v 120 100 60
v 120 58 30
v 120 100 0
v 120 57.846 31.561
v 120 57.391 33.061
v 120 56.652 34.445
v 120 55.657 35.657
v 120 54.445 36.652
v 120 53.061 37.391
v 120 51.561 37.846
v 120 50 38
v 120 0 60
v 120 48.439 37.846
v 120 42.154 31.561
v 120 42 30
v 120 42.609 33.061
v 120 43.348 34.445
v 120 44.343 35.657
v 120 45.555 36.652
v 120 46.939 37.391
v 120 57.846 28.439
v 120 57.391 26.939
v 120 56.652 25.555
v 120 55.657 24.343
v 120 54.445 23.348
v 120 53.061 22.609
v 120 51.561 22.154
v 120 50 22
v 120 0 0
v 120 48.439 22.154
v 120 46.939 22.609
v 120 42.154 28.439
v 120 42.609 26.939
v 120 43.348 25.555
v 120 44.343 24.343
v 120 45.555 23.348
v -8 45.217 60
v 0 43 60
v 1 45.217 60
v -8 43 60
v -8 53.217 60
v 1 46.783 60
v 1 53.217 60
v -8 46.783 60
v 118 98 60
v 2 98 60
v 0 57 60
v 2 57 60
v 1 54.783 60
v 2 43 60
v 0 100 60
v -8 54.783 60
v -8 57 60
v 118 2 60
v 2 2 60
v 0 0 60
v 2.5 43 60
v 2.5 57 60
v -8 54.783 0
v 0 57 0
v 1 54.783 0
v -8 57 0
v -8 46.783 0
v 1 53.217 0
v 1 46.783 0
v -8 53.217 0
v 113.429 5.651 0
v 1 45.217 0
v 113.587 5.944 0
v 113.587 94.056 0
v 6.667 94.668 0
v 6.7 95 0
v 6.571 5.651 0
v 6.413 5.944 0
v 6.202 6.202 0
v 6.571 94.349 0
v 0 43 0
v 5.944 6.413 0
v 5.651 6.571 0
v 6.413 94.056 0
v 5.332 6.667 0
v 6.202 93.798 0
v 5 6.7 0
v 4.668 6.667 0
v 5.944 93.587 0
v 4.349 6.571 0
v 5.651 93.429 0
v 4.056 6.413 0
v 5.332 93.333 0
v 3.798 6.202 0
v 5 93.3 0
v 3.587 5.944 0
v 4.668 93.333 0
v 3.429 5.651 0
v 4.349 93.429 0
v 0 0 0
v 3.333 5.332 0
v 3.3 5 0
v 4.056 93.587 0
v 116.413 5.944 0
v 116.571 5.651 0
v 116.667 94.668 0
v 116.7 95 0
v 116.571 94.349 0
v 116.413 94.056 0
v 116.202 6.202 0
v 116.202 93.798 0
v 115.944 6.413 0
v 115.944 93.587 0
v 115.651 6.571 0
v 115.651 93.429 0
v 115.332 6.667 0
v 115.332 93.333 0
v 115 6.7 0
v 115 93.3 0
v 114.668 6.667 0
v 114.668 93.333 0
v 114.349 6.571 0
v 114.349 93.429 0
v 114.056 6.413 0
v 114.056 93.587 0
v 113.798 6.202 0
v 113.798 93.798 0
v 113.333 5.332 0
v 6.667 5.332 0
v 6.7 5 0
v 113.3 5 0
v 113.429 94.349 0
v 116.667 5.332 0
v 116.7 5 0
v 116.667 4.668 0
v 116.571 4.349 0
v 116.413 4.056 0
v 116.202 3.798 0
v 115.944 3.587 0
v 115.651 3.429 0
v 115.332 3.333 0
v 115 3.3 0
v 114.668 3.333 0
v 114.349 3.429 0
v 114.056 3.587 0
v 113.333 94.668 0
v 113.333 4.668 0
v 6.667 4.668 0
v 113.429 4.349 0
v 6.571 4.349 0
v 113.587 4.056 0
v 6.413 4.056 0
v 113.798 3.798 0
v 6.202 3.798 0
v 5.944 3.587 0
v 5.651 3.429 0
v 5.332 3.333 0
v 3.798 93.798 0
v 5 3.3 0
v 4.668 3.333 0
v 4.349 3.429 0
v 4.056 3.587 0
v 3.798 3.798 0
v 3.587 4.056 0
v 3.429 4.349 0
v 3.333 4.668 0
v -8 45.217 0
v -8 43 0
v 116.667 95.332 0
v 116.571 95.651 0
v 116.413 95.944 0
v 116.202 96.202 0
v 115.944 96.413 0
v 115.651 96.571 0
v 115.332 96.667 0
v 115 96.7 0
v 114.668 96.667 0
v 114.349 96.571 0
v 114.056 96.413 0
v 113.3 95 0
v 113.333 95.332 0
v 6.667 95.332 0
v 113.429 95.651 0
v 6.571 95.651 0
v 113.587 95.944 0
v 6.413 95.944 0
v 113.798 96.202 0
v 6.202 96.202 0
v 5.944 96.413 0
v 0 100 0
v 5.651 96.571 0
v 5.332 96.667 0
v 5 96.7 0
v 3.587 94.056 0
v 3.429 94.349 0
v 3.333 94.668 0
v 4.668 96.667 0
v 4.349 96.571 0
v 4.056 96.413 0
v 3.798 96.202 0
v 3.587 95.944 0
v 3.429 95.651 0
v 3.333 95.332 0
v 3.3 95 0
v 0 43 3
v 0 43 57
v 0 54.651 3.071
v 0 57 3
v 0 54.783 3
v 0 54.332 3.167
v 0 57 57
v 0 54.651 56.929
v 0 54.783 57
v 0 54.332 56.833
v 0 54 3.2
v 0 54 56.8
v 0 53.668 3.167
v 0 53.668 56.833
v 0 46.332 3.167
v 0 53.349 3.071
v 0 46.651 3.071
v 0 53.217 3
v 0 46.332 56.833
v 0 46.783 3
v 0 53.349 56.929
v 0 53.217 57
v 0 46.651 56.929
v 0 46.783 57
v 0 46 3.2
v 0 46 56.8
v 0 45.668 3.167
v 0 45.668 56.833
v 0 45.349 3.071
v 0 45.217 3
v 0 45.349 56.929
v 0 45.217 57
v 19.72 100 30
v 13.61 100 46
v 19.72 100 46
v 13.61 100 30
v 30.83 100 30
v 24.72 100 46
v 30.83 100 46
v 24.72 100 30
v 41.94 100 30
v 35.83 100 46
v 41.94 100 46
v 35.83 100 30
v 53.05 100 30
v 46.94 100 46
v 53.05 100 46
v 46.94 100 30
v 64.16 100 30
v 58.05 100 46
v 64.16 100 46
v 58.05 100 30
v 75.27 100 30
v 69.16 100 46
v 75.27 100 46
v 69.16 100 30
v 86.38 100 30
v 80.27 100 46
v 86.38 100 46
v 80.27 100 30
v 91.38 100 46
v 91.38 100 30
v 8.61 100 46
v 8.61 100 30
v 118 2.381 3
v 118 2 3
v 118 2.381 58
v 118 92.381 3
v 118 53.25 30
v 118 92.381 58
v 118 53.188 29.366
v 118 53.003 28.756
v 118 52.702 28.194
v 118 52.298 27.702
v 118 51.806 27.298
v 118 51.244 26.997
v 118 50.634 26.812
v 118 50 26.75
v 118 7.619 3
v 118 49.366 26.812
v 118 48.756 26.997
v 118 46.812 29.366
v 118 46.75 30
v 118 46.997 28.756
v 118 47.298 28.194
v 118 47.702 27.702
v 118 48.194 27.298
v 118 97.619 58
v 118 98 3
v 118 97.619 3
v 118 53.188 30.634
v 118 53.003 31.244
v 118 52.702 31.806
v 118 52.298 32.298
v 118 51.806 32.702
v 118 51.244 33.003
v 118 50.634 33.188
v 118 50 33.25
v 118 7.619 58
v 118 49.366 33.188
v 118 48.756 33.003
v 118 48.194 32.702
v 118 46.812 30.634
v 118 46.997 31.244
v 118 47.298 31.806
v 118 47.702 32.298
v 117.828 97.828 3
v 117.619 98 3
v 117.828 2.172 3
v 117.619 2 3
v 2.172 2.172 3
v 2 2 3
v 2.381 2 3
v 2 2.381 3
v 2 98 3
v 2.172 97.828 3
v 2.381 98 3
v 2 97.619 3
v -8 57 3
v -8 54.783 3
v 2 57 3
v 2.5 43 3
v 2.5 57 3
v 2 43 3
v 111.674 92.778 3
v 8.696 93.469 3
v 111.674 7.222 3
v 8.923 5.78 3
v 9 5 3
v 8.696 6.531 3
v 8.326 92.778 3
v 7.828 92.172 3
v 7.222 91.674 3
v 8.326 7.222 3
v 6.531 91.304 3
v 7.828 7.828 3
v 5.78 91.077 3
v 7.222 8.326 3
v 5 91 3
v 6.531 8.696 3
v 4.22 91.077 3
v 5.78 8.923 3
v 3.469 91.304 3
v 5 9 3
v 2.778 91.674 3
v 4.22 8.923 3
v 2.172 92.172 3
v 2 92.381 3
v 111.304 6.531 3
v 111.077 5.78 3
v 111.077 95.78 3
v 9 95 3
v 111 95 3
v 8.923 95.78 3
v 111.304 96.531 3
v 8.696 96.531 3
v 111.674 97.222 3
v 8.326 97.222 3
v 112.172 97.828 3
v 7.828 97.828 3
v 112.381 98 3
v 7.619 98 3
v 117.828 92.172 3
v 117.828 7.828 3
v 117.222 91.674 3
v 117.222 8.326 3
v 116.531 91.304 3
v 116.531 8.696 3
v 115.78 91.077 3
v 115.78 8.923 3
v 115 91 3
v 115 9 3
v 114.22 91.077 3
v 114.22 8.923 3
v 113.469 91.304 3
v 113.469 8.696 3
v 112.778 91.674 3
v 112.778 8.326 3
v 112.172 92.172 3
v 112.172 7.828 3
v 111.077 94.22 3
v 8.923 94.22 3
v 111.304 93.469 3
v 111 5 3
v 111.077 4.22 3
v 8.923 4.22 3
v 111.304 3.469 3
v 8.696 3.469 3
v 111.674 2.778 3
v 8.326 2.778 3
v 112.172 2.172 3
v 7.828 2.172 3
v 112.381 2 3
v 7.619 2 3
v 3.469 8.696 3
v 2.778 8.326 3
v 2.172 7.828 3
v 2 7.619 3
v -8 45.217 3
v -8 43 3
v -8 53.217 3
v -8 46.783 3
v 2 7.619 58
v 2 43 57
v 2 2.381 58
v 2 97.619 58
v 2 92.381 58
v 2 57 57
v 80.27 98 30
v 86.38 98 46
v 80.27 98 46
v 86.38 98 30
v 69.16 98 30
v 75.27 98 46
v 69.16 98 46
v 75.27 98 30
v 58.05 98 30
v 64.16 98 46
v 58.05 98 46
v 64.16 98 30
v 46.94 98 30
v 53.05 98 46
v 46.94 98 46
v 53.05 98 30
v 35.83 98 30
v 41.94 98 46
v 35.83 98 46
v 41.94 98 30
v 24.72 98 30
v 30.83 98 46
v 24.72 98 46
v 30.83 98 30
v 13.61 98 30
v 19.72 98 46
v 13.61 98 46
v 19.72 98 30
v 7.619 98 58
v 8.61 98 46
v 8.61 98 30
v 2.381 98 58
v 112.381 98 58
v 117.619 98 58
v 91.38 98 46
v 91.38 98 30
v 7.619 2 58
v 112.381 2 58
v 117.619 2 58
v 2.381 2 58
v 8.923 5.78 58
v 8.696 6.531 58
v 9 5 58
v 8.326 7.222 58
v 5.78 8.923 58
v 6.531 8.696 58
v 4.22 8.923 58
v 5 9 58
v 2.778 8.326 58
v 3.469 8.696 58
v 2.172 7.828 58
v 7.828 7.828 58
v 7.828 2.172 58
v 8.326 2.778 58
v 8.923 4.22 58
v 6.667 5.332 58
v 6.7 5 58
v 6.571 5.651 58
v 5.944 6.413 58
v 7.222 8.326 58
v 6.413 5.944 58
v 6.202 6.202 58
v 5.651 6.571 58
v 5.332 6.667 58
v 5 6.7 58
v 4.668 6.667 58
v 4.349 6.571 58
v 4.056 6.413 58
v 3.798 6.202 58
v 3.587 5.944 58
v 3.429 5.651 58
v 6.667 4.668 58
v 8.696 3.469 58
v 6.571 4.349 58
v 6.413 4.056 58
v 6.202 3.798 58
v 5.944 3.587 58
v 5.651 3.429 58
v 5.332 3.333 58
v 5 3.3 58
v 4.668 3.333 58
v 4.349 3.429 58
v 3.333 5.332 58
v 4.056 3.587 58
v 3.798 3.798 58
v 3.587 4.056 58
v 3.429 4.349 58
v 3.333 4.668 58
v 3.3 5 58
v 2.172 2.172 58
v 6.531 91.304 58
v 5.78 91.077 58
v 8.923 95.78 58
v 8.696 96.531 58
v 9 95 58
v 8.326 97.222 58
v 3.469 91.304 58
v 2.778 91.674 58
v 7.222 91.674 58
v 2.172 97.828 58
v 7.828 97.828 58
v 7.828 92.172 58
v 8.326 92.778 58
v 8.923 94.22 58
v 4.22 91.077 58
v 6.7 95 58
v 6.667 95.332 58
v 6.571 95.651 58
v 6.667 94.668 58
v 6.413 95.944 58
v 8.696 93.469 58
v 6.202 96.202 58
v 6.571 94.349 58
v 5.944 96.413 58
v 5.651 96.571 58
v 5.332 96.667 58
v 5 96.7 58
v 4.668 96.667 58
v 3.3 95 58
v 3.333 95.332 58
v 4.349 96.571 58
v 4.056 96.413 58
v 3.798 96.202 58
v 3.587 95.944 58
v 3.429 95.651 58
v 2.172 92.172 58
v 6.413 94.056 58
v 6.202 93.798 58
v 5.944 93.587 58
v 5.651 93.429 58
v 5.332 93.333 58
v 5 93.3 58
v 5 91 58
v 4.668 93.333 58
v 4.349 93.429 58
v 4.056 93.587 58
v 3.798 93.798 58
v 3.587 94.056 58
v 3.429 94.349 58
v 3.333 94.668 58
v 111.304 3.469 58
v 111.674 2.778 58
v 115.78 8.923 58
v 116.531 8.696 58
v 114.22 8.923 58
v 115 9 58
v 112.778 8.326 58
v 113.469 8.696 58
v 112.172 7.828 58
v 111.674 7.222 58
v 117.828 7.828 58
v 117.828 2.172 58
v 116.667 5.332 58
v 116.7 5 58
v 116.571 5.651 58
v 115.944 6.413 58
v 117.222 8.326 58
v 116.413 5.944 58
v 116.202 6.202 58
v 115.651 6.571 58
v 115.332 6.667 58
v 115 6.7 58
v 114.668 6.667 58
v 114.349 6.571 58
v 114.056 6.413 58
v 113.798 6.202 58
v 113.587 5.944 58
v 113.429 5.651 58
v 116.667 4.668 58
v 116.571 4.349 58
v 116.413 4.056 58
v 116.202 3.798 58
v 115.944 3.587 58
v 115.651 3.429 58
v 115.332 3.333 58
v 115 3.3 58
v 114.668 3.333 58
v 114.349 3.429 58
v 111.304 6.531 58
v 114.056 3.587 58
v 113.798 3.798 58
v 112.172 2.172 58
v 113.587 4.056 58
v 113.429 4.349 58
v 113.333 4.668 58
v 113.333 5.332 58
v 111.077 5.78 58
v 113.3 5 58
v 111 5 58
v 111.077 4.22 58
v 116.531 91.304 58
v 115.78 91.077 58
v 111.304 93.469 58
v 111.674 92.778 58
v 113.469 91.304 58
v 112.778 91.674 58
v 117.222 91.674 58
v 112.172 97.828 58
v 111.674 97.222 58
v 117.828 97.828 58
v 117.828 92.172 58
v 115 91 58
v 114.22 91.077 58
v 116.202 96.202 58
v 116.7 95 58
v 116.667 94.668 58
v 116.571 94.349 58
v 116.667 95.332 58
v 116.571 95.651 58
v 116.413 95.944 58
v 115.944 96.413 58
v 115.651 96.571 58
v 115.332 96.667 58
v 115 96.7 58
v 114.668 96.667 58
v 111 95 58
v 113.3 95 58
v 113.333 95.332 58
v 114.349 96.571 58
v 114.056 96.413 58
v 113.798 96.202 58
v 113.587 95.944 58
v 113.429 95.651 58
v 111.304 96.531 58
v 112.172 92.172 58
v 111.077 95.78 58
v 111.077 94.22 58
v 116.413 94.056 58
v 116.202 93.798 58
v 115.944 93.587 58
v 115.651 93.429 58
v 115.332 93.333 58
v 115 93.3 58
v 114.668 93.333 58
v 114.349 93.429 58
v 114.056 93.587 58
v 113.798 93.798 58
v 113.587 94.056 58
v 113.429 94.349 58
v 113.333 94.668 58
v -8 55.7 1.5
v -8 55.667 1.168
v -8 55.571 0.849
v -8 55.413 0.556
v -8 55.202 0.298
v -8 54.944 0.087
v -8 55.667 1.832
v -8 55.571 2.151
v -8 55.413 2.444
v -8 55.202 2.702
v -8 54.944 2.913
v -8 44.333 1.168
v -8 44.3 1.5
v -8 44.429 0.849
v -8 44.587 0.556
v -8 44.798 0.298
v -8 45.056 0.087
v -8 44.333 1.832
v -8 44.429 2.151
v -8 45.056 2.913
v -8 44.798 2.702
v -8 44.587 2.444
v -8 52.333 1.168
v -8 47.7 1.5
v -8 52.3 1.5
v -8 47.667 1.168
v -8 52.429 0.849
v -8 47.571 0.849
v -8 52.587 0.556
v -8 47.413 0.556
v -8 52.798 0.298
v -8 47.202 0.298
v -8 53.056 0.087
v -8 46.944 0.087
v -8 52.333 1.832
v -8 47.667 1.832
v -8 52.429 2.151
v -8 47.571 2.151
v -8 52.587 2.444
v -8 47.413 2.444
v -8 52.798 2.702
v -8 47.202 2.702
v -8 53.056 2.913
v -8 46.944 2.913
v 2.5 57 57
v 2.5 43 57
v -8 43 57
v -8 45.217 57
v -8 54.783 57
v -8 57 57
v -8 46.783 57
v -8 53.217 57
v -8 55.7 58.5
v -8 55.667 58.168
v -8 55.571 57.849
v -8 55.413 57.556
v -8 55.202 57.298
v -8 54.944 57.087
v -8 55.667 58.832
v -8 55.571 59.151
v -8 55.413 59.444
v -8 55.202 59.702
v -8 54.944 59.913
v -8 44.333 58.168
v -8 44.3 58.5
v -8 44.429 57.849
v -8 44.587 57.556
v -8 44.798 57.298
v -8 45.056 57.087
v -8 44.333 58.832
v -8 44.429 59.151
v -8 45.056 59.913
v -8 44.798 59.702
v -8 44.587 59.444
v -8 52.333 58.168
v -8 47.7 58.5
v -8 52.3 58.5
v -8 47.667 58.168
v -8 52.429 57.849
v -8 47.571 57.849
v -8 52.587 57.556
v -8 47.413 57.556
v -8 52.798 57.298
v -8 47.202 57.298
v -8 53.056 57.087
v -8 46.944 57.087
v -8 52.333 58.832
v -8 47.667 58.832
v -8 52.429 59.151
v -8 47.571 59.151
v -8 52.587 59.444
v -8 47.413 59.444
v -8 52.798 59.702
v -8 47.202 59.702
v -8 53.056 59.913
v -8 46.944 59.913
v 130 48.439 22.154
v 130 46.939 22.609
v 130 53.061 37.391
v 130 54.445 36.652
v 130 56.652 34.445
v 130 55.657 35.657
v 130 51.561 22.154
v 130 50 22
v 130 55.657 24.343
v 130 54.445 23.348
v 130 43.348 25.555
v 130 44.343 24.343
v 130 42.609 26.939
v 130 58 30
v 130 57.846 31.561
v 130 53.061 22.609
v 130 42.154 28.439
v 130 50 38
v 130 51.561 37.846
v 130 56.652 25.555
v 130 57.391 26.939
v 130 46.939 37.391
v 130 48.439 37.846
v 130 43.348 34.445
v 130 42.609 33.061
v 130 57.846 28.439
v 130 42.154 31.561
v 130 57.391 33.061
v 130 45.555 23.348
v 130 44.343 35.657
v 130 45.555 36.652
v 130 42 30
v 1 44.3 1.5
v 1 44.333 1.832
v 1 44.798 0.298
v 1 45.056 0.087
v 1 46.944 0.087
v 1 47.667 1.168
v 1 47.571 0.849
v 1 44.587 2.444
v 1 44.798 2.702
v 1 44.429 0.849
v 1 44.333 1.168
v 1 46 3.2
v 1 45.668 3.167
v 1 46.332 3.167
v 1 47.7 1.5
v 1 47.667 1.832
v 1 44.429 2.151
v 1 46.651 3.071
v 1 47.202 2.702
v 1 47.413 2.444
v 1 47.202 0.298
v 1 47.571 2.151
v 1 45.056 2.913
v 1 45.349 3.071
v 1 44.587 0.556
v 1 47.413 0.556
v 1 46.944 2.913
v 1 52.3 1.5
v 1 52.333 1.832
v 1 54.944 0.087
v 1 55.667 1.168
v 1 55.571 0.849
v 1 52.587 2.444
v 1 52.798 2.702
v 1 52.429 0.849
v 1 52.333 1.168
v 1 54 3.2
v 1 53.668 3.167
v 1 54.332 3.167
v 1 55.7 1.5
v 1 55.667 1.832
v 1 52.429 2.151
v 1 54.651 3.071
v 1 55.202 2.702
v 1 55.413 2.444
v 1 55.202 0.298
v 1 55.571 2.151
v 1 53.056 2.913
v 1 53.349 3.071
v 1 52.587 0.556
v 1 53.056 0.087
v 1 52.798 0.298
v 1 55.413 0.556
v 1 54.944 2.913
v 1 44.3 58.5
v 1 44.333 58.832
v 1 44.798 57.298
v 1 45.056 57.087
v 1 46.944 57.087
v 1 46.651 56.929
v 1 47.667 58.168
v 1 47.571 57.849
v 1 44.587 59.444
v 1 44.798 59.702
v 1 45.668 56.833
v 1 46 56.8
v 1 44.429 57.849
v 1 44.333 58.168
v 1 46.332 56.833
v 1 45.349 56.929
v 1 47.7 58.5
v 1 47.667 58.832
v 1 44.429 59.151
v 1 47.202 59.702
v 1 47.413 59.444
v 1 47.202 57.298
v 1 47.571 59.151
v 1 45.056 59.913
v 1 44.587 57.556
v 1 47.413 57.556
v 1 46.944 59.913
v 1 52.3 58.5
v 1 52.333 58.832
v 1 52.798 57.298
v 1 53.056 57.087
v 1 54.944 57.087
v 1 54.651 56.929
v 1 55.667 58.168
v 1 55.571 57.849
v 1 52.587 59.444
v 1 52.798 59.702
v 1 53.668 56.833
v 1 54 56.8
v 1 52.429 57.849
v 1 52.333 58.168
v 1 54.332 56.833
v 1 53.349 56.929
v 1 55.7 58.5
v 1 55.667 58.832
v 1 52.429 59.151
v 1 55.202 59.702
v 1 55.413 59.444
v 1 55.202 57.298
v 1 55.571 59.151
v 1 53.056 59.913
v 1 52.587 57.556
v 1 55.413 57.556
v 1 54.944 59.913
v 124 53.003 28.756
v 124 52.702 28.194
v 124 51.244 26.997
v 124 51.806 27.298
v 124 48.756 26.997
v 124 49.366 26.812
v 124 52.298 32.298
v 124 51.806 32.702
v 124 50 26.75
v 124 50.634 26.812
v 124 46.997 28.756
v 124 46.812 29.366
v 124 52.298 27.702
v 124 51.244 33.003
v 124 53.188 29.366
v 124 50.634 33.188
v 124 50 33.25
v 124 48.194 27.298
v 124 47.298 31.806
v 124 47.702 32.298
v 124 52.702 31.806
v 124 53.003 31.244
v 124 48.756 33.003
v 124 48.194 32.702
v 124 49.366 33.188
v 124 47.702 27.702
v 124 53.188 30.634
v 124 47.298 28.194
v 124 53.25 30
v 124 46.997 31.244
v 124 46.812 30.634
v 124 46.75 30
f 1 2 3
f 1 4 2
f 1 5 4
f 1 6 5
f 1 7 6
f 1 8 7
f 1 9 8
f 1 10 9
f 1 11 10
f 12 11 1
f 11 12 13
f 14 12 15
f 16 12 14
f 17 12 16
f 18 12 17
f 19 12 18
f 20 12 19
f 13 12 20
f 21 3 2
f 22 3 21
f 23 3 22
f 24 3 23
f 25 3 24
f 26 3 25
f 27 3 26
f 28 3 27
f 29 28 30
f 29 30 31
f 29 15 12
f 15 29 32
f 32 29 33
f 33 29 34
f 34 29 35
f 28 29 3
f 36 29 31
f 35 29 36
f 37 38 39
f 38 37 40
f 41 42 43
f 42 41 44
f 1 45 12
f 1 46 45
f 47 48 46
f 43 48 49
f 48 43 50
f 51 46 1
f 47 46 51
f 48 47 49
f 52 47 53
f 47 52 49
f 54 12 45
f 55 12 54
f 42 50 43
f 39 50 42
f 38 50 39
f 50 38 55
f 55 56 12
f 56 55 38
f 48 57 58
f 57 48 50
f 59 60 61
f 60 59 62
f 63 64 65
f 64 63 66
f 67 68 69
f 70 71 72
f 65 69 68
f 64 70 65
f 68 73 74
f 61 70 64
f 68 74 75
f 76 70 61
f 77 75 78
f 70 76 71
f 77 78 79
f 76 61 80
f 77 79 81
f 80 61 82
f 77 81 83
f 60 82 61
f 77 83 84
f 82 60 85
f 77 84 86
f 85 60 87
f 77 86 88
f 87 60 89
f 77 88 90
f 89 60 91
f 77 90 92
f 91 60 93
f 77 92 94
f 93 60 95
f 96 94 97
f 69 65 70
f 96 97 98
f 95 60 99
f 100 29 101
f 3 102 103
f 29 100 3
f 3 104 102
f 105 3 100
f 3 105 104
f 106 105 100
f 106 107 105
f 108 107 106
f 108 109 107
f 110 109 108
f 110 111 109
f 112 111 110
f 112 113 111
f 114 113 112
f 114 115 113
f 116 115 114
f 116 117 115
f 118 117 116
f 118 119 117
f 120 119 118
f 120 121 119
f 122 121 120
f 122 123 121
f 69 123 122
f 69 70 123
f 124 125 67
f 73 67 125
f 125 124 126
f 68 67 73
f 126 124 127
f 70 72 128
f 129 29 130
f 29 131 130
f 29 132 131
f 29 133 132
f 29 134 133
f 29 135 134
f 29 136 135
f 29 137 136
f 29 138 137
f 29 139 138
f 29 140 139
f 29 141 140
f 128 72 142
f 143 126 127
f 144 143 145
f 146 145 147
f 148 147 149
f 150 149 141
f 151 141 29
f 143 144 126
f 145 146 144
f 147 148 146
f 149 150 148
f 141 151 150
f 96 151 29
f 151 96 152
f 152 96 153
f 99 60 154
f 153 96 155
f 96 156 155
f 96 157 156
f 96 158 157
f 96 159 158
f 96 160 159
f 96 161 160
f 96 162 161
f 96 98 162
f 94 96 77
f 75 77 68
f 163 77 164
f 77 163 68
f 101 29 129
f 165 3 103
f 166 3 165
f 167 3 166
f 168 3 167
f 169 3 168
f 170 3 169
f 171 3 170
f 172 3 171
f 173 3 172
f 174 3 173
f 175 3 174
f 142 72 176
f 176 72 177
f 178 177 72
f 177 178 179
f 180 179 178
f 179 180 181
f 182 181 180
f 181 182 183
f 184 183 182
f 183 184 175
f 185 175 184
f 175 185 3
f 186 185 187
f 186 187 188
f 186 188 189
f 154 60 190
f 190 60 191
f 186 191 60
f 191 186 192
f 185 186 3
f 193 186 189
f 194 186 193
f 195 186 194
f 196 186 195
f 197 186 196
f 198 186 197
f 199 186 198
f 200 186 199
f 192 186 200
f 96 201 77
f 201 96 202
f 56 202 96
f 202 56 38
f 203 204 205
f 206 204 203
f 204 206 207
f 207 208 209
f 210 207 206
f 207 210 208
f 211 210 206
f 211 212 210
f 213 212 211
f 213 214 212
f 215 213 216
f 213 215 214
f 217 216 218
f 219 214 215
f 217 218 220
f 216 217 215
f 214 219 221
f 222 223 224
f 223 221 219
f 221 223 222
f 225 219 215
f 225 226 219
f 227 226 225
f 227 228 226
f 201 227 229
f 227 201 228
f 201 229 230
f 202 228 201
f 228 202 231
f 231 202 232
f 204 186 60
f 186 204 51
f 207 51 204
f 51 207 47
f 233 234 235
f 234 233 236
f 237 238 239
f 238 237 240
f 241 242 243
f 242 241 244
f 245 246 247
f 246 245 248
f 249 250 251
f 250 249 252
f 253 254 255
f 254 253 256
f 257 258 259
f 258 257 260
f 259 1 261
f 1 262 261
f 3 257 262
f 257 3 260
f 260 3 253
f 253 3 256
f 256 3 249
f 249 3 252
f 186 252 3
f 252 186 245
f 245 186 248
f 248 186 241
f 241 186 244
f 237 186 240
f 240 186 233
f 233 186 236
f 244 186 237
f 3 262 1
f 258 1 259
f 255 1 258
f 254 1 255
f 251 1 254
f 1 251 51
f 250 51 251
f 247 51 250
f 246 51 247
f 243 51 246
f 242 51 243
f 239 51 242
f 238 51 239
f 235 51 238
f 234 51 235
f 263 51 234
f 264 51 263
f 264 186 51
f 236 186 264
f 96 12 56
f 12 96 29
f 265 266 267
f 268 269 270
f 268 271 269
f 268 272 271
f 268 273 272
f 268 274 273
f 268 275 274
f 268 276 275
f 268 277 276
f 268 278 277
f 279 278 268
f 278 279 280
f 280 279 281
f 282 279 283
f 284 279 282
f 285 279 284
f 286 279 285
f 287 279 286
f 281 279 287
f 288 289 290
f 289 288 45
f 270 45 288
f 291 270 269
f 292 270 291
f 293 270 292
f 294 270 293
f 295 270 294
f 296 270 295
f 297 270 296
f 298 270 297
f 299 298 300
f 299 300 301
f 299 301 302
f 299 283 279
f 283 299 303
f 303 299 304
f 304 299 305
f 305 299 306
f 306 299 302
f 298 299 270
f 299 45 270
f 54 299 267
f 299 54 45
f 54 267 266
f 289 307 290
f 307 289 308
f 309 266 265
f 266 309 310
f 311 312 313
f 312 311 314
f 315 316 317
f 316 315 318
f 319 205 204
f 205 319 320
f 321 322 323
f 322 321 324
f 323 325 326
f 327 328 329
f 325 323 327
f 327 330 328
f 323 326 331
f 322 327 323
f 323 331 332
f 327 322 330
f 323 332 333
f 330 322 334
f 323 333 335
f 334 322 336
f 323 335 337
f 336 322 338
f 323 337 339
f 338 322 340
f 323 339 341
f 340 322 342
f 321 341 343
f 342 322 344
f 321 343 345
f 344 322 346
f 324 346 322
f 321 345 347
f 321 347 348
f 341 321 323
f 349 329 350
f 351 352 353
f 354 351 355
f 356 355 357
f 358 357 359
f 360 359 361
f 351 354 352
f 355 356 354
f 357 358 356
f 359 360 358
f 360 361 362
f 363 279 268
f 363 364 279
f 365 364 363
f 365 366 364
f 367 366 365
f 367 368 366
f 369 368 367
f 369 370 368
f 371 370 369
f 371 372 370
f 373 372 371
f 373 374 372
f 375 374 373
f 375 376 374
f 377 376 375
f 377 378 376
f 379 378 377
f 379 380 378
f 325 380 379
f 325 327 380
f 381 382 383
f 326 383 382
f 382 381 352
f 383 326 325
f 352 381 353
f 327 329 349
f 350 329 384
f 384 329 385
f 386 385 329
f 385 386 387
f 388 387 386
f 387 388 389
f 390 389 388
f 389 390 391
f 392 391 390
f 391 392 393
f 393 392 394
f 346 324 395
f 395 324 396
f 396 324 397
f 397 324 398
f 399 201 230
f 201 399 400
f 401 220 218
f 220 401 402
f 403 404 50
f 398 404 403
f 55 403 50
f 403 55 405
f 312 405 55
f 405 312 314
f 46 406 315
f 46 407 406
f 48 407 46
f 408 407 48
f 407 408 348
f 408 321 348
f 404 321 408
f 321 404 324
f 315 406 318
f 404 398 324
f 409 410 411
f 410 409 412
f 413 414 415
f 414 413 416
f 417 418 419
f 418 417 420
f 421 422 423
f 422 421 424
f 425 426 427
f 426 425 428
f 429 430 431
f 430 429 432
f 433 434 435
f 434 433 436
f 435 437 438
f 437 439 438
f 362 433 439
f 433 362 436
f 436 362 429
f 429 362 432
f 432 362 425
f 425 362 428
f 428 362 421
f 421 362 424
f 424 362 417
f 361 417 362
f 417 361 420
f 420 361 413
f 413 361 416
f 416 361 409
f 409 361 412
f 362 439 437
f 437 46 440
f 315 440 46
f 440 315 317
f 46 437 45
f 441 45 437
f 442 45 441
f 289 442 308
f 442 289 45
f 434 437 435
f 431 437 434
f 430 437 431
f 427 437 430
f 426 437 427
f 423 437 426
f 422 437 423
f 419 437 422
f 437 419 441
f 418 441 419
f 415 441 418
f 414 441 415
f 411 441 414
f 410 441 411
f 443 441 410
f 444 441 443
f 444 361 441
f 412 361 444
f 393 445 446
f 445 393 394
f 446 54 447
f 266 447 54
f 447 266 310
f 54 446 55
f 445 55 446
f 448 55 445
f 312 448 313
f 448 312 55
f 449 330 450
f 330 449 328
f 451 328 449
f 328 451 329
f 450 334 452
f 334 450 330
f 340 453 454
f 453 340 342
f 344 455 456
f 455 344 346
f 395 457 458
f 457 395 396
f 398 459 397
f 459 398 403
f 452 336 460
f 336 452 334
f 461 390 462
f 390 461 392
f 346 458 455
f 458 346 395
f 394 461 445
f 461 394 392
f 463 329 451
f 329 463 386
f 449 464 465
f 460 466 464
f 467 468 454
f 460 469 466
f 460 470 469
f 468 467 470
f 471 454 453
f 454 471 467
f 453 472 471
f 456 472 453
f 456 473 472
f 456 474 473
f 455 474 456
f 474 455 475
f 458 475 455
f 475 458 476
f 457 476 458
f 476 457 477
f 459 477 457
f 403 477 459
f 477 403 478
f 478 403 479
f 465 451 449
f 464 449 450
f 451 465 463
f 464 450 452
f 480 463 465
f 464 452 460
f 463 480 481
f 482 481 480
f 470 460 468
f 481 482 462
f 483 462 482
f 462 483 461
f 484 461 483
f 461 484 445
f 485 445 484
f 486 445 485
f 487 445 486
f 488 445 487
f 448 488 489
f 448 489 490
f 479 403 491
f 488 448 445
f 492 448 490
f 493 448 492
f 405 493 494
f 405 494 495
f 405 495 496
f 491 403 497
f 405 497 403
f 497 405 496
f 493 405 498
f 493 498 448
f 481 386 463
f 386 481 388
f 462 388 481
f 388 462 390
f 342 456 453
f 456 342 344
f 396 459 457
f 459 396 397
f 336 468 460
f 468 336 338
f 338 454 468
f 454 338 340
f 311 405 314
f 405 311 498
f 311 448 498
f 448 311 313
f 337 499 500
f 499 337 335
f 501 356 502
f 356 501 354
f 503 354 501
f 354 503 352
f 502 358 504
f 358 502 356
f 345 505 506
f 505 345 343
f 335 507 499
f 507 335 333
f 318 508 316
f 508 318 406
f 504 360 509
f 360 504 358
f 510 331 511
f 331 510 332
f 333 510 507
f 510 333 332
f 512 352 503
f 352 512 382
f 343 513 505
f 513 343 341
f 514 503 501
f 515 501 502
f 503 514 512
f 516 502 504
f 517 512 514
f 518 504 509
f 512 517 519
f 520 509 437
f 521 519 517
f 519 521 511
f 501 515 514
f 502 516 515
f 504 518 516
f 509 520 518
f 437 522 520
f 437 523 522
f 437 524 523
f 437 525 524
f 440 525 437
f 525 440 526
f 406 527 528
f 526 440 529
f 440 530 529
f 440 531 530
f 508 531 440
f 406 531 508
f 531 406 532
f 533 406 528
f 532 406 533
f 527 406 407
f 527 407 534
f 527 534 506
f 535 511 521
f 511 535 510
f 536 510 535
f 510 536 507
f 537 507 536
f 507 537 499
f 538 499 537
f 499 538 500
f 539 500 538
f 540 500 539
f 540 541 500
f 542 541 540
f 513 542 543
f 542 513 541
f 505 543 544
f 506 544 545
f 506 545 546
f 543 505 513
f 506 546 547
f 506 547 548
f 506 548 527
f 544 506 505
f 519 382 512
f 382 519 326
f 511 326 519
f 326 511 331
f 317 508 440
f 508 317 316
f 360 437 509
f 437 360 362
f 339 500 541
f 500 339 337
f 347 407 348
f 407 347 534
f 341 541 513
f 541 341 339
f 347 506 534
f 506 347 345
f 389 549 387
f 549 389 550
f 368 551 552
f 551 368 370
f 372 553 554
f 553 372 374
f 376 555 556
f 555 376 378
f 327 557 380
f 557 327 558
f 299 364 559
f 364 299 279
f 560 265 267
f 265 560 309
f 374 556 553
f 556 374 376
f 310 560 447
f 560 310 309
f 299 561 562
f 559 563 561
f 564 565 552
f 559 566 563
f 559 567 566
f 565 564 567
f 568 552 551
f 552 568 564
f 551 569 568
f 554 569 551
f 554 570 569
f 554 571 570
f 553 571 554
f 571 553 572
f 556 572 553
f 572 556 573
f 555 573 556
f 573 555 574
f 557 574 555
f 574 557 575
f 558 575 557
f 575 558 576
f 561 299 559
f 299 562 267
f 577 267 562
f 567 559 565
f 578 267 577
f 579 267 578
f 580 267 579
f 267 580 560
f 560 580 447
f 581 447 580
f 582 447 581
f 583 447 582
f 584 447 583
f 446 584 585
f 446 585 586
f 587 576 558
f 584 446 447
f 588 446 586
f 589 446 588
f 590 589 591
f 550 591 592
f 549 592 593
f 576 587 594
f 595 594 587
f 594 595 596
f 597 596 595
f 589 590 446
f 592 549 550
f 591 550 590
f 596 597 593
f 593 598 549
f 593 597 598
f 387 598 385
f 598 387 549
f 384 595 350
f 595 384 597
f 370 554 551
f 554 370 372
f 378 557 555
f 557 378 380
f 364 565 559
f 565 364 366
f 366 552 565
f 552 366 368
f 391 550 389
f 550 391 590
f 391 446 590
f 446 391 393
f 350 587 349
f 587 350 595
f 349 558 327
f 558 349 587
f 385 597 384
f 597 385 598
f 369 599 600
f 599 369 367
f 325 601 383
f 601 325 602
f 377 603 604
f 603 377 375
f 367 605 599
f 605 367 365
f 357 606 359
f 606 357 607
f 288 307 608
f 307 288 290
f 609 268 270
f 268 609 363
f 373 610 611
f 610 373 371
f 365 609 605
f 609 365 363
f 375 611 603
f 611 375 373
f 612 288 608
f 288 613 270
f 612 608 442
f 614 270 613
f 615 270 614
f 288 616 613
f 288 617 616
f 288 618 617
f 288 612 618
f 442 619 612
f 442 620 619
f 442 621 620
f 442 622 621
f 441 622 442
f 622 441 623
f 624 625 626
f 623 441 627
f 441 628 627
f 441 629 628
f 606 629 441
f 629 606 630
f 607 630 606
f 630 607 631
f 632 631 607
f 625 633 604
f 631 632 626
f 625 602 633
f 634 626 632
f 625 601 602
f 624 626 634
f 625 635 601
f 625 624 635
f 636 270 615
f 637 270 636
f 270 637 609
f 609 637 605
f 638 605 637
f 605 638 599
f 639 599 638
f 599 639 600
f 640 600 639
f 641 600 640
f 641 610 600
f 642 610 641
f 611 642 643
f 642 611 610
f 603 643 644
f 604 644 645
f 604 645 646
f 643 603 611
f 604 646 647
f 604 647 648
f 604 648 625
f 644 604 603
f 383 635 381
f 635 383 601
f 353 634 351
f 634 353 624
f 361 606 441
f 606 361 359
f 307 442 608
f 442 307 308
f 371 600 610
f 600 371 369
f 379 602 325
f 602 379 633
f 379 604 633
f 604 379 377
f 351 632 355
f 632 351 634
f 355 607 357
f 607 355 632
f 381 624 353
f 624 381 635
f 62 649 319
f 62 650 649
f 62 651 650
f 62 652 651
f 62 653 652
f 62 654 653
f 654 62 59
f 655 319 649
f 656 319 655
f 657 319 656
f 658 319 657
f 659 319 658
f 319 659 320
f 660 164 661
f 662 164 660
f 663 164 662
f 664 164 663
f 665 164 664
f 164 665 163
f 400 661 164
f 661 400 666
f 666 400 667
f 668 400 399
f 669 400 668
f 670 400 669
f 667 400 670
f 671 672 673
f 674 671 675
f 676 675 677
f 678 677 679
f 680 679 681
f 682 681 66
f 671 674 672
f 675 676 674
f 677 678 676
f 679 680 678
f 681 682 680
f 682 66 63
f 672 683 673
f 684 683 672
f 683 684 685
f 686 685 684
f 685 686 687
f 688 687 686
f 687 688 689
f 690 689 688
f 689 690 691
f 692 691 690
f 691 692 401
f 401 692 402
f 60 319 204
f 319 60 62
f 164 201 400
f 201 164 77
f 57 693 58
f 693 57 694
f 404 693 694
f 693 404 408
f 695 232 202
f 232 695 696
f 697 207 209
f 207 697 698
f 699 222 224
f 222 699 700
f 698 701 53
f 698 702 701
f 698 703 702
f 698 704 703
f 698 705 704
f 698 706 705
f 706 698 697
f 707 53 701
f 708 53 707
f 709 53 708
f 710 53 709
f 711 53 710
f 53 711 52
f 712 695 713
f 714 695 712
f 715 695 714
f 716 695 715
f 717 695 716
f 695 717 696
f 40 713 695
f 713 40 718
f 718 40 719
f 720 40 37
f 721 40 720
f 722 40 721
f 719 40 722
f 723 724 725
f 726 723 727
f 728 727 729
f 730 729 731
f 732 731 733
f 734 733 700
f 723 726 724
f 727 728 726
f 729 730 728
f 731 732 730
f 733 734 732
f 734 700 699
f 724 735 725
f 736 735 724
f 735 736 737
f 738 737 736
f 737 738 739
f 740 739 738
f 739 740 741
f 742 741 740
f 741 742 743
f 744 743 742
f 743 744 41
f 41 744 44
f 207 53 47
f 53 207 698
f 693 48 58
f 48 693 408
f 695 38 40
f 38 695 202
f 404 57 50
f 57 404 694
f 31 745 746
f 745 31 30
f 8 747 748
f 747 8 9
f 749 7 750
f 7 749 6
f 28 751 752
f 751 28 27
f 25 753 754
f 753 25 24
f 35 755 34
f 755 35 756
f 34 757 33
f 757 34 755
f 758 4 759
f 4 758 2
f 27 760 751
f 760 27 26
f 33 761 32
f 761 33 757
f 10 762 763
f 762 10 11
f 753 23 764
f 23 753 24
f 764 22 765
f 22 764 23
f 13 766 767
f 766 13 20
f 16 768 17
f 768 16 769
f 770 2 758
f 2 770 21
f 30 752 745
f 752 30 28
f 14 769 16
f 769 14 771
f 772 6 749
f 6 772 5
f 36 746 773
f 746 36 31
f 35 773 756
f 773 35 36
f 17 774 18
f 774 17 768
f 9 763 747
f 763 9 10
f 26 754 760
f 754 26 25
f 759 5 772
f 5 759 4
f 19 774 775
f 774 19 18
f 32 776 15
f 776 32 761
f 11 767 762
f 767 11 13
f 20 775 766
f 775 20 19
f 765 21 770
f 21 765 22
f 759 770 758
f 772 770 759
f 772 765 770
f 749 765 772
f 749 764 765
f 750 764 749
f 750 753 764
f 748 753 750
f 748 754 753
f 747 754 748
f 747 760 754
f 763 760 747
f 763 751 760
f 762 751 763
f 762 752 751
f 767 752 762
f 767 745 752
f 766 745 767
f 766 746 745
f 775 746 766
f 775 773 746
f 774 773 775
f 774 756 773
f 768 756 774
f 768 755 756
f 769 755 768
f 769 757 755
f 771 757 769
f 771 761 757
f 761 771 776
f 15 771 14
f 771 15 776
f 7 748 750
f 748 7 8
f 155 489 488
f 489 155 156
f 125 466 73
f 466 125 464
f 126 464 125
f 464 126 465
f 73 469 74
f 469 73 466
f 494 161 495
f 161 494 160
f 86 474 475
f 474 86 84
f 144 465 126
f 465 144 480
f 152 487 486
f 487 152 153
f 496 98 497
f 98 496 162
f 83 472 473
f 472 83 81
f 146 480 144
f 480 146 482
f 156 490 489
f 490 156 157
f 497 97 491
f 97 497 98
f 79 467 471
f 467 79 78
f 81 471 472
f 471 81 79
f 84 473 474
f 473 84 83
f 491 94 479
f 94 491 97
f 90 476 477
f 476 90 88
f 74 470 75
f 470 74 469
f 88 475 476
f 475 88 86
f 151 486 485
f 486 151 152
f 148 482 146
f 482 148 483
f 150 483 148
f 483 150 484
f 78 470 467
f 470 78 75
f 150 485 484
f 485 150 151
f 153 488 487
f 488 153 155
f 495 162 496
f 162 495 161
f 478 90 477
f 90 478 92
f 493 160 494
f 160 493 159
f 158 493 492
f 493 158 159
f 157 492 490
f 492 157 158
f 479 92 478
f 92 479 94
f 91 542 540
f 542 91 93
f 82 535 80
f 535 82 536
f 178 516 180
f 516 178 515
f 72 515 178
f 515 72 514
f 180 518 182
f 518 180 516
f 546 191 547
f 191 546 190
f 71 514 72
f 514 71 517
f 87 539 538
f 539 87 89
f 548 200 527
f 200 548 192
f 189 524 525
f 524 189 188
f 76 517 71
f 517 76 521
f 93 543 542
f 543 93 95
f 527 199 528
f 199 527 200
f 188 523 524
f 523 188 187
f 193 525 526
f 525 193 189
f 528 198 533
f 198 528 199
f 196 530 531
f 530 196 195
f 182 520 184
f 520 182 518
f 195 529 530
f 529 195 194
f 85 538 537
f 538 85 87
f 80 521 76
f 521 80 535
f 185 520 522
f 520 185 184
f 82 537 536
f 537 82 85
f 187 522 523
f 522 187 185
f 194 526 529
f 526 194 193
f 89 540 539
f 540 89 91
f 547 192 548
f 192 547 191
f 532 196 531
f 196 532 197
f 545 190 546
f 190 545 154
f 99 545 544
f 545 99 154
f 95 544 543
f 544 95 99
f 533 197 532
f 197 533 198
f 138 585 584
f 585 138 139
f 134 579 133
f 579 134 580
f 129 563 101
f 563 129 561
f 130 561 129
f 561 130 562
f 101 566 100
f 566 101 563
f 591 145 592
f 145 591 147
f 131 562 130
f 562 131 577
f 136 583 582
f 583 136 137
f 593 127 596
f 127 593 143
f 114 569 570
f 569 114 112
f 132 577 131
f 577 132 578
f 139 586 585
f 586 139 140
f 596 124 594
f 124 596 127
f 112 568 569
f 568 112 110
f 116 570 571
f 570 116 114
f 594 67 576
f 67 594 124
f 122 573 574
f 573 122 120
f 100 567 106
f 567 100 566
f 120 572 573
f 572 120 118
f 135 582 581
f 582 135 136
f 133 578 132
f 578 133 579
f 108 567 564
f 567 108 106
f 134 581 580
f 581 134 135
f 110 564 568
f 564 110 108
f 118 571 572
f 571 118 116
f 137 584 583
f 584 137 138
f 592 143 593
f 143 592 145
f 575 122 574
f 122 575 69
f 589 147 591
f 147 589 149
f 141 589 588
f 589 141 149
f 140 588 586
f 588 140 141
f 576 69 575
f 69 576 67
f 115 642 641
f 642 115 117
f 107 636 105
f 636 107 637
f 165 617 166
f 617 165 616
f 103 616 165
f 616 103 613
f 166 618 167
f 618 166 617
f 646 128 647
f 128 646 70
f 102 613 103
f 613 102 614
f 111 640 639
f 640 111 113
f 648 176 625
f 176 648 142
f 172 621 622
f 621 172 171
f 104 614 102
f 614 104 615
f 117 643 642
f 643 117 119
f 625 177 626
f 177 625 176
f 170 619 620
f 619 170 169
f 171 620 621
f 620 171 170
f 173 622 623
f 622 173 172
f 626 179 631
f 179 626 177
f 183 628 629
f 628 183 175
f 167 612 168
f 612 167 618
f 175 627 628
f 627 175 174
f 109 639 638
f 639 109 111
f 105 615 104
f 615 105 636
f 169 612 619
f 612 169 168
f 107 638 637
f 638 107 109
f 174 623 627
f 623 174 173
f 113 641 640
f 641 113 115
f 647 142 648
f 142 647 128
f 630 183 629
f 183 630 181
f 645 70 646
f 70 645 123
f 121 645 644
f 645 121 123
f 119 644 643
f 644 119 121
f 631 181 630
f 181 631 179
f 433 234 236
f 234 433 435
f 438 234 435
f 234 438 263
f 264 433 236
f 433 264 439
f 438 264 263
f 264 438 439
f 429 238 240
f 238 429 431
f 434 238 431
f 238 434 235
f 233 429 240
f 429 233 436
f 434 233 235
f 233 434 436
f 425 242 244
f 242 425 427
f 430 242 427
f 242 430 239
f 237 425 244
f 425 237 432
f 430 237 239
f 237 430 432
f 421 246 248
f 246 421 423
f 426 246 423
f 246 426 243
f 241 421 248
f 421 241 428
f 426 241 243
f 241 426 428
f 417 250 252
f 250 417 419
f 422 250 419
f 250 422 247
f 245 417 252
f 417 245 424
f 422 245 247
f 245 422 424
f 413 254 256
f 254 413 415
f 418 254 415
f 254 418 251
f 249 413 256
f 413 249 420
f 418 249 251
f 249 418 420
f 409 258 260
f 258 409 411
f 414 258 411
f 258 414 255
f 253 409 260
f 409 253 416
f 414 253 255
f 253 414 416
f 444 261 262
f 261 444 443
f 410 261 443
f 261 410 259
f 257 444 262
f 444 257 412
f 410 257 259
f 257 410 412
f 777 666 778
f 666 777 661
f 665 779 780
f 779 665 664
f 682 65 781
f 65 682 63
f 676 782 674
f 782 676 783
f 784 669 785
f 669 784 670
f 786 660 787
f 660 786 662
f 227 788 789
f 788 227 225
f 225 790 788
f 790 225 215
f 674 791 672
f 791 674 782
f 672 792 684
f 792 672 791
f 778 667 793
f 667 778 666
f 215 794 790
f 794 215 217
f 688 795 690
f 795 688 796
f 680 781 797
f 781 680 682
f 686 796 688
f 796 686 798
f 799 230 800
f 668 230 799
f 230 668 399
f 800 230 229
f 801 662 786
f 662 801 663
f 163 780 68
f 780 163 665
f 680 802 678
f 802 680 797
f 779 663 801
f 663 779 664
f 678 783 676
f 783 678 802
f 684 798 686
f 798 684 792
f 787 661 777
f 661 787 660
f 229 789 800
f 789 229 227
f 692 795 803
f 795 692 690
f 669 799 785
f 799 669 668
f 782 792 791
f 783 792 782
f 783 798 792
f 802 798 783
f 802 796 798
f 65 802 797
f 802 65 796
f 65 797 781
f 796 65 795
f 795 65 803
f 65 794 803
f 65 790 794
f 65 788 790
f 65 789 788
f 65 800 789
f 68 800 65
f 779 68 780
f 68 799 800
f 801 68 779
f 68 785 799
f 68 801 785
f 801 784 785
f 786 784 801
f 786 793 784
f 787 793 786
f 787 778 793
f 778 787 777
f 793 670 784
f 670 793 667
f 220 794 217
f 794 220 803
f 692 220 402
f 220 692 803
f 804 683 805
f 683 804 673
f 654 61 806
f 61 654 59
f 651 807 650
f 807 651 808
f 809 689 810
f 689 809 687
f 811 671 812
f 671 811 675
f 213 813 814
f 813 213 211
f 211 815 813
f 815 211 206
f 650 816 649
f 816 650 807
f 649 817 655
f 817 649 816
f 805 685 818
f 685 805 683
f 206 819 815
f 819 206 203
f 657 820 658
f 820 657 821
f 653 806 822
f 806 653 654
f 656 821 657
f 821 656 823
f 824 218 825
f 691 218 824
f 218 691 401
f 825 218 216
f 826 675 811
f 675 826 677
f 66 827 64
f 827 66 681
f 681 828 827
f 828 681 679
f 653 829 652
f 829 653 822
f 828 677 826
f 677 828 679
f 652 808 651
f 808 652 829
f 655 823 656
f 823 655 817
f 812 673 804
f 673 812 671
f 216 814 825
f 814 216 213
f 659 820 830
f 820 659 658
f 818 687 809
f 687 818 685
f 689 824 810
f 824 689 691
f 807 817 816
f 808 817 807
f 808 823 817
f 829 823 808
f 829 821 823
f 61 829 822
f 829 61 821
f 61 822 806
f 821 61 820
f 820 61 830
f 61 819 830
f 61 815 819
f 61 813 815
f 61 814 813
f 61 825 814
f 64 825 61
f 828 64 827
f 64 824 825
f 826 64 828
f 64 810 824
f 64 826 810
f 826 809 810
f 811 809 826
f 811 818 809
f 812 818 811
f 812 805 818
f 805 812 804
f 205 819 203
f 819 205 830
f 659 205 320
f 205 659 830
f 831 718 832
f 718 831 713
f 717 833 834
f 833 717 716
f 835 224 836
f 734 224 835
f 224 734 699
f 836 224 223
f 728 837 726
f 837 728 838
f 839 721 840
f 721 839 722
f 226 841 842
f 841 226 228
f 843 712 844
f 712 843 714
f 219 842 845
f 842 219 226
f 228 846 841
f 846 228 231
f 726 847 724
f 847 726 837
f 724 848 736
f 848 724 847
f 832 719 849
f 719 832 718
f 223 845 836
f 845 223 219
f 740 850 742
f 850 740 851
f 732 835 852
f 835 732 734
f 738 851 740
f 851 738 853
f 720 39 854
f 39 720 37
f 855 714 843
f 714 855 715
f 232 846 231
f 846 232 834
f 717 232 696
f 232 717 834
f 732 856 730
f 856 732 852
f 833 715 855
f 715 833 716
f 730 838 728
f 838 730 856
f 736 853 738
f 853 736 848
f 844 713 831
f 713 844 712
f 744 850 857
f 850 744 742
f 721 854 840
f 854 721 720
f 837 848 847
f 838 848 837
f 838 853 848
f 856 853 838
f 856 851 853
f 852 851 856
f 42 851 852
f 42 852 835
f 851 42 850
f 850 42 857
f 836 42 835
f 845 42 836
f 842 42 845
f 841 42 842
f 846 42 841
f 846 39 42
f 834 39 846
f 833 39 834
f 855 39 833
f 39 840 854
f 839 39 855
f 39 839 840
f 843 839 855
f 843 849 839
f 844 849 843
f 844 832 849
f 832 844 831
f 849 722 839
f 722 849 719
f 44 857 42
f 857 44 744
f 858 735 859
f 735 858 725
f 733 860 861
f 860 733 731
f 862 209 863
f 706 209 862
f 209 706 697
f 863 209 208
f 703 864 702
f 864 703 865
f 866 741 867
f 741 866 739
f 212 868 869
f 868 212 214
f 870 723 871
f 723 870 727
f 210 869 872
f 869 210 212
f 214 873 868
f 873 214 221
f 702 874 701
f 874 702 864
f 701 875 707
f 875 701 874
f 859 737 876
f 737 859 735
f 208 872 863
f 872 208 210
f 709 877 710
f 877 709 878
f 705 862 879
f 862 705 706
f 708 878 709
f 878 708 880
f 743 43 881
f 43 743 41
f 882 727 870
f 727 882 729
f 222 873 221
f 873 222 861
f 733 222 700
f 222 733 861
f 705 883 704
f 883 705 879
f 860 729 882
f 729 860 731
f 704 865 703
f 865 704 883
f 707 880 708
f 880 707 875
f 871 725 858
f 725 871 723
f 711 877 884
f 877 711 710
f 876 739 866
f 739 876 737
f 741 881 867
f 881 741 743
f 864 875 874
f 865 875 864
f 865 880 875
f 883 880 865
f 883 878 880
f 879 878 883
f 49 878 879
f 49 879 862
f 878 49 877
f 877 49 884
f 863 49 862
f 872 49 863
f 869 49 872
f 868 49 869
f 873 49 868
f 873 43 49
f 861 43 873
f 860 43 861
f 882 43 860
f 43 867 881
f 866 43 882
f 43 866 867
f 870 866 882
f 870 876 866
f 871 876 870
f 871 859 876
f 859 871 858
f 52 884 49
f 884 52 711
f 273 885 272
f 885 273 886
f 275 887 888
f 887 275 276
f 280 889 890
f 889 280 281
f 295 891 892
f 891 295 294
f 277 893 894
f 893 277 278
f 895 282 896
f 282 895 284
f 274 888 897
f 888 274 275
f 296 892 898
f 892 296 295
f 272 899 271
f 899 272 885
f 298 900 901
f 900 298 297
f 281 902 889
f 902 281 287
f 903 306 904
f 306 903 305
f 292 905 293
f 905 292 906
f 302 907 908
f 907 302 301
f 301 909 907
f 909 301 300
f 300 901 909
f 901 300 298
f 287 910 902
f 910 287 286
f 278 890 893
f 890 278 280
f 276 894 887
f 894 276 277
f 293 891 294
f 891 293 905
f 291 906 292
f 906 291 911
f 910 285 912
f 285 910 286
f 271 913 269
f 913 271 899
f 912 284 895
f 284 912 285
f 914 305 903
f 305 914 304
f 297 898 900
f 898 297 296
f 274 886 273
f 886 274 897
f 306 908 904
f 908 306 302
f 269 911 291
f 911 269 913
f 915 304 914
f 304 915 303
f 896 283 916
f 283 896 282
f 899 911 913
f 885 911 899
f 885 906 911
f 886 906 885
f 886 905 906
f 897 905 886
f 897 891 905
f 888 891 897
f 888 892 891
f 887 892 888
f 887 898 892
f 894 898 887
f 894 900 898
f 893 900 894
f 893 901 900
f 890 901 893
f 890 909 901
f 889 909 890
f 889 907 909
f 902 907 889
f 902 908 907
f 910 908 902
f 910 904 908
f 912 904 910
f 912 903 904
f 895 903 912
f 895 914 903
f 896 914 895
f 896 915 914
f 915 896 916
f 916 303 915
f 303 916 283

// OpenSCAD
$fn = 32;

// ----------------------------------------------------------------------
// Enclosure body: 120 x 100 x 60 mm, wall 2 mm
// ----------------------------------------------------------------------

// --- parameters (mm) ---
length = 120;             // outside length, X
width = 100;              // outside width, Y
height = 60;              // outside height, Z
wall = 2;                 // side wall thickness
floor_t = 3;              // floor thickness
boss_d = 8;               // corner boss diameter
boss_h = 55;              // corner boss height above the floor
boss_hole_d = 3.4;        // lid screw clearance in the boss
boss_lip = 5;             // boss centre inset from the corner
ear_w = 14;               // mounting ear width
ear_t = 3;                // mounting ear thickness
ear_ext = 8;              // mounting ear reach
ear_hole_d = 3.4;         // mounting ear drills
vent_slots = 8;           // vent slots in the long wall
vent_w = 5;               // vent slot width
vent_h = 16;              // vent slot height
vent_pitch = 11.11;       // vent slot pitch
vent_z = 30;              // vent slot sill height
nipple_d = 16;            // cable gland boss diameter
nipple_h = 10;            // cable gland boss height
nipple_bore = 6.5;        // cable gland bore

module shell() {
  difference() {
    cube([length, width, height]);
    /* hollow, open at the top */
    translate([wall, wall, floor_t])
      cube([length - 2 * wall, width - 2 * wall, height]);
  }
}

module bosses() {
  /* corner bosses, sunk 1 mm into the floor */
  for (sx = [0, 1]) for (sy = [0, 1])
    translate([sx * (length - 2 * boss_lip) + boss_lip, sy * (width - 2 * boss_lip) + boss_lip, floor_t - 1])
      cylinder(h = boss_h + 1, d = boss_d);
}

module gland() {
  /* boss on the short wall, sunk 1 mm into it */
  translate([length - 1, width / 2, height * 0.5]) rotate([0, 90, 0])
    cylinder(h = nipple_h + 1, d = nipple_d);
}

module ears() {
  /* mounting ears on the short walls, sunk into the wall */
  for (sz = [0, 1])
    translate([-ear_ext, width / 2 - ear_w / 2, sz * (height - ear_t)])
      cube([ear_ext + 2.5, ear_w, ear_t]);
}

difference() {
  union() {
    shell();
    bosses();
    gland();
    ears();
  }
  /* boss screw holes */
  for (sx = [0, 1]) for (sy = [0, 1])
    translate([sx * (length - 2 * boss_lip) + boss_lip, sy * (width - 2 * boss_lip) + boss_lip, -1]) cylinder(h = floor_t + boss_h + 2, d = boss_hole_d);
  /* vent grille in the +Y wall */
  for (i = [0 : vent_slots - 1]) translate([vent_pitch * (i + 1) - vent_w / 2, width - wall - 1, vent_z]) cube([vent_w, wall + 2, vent_h]);
  translate([length, width / 2, height * 0.5]) rotate([0, 90, 0]) translate([0, 0, -nipple_h - 2]) cylinder(h = nipple_h + wall + 4, d = nipple_bore);
  for (sz = [0, 1]) for (sx = [0, 1]) translate([-ear_ext - 1, width / 2 + (2 * sx - 1) * (ear_w / 2 - 3), sz * (height - ear_t) + ear_t / 2]) rotate([0, 90, 0]) cylinder(h = ear_ext + 2, d = ear_hole_d);
}
